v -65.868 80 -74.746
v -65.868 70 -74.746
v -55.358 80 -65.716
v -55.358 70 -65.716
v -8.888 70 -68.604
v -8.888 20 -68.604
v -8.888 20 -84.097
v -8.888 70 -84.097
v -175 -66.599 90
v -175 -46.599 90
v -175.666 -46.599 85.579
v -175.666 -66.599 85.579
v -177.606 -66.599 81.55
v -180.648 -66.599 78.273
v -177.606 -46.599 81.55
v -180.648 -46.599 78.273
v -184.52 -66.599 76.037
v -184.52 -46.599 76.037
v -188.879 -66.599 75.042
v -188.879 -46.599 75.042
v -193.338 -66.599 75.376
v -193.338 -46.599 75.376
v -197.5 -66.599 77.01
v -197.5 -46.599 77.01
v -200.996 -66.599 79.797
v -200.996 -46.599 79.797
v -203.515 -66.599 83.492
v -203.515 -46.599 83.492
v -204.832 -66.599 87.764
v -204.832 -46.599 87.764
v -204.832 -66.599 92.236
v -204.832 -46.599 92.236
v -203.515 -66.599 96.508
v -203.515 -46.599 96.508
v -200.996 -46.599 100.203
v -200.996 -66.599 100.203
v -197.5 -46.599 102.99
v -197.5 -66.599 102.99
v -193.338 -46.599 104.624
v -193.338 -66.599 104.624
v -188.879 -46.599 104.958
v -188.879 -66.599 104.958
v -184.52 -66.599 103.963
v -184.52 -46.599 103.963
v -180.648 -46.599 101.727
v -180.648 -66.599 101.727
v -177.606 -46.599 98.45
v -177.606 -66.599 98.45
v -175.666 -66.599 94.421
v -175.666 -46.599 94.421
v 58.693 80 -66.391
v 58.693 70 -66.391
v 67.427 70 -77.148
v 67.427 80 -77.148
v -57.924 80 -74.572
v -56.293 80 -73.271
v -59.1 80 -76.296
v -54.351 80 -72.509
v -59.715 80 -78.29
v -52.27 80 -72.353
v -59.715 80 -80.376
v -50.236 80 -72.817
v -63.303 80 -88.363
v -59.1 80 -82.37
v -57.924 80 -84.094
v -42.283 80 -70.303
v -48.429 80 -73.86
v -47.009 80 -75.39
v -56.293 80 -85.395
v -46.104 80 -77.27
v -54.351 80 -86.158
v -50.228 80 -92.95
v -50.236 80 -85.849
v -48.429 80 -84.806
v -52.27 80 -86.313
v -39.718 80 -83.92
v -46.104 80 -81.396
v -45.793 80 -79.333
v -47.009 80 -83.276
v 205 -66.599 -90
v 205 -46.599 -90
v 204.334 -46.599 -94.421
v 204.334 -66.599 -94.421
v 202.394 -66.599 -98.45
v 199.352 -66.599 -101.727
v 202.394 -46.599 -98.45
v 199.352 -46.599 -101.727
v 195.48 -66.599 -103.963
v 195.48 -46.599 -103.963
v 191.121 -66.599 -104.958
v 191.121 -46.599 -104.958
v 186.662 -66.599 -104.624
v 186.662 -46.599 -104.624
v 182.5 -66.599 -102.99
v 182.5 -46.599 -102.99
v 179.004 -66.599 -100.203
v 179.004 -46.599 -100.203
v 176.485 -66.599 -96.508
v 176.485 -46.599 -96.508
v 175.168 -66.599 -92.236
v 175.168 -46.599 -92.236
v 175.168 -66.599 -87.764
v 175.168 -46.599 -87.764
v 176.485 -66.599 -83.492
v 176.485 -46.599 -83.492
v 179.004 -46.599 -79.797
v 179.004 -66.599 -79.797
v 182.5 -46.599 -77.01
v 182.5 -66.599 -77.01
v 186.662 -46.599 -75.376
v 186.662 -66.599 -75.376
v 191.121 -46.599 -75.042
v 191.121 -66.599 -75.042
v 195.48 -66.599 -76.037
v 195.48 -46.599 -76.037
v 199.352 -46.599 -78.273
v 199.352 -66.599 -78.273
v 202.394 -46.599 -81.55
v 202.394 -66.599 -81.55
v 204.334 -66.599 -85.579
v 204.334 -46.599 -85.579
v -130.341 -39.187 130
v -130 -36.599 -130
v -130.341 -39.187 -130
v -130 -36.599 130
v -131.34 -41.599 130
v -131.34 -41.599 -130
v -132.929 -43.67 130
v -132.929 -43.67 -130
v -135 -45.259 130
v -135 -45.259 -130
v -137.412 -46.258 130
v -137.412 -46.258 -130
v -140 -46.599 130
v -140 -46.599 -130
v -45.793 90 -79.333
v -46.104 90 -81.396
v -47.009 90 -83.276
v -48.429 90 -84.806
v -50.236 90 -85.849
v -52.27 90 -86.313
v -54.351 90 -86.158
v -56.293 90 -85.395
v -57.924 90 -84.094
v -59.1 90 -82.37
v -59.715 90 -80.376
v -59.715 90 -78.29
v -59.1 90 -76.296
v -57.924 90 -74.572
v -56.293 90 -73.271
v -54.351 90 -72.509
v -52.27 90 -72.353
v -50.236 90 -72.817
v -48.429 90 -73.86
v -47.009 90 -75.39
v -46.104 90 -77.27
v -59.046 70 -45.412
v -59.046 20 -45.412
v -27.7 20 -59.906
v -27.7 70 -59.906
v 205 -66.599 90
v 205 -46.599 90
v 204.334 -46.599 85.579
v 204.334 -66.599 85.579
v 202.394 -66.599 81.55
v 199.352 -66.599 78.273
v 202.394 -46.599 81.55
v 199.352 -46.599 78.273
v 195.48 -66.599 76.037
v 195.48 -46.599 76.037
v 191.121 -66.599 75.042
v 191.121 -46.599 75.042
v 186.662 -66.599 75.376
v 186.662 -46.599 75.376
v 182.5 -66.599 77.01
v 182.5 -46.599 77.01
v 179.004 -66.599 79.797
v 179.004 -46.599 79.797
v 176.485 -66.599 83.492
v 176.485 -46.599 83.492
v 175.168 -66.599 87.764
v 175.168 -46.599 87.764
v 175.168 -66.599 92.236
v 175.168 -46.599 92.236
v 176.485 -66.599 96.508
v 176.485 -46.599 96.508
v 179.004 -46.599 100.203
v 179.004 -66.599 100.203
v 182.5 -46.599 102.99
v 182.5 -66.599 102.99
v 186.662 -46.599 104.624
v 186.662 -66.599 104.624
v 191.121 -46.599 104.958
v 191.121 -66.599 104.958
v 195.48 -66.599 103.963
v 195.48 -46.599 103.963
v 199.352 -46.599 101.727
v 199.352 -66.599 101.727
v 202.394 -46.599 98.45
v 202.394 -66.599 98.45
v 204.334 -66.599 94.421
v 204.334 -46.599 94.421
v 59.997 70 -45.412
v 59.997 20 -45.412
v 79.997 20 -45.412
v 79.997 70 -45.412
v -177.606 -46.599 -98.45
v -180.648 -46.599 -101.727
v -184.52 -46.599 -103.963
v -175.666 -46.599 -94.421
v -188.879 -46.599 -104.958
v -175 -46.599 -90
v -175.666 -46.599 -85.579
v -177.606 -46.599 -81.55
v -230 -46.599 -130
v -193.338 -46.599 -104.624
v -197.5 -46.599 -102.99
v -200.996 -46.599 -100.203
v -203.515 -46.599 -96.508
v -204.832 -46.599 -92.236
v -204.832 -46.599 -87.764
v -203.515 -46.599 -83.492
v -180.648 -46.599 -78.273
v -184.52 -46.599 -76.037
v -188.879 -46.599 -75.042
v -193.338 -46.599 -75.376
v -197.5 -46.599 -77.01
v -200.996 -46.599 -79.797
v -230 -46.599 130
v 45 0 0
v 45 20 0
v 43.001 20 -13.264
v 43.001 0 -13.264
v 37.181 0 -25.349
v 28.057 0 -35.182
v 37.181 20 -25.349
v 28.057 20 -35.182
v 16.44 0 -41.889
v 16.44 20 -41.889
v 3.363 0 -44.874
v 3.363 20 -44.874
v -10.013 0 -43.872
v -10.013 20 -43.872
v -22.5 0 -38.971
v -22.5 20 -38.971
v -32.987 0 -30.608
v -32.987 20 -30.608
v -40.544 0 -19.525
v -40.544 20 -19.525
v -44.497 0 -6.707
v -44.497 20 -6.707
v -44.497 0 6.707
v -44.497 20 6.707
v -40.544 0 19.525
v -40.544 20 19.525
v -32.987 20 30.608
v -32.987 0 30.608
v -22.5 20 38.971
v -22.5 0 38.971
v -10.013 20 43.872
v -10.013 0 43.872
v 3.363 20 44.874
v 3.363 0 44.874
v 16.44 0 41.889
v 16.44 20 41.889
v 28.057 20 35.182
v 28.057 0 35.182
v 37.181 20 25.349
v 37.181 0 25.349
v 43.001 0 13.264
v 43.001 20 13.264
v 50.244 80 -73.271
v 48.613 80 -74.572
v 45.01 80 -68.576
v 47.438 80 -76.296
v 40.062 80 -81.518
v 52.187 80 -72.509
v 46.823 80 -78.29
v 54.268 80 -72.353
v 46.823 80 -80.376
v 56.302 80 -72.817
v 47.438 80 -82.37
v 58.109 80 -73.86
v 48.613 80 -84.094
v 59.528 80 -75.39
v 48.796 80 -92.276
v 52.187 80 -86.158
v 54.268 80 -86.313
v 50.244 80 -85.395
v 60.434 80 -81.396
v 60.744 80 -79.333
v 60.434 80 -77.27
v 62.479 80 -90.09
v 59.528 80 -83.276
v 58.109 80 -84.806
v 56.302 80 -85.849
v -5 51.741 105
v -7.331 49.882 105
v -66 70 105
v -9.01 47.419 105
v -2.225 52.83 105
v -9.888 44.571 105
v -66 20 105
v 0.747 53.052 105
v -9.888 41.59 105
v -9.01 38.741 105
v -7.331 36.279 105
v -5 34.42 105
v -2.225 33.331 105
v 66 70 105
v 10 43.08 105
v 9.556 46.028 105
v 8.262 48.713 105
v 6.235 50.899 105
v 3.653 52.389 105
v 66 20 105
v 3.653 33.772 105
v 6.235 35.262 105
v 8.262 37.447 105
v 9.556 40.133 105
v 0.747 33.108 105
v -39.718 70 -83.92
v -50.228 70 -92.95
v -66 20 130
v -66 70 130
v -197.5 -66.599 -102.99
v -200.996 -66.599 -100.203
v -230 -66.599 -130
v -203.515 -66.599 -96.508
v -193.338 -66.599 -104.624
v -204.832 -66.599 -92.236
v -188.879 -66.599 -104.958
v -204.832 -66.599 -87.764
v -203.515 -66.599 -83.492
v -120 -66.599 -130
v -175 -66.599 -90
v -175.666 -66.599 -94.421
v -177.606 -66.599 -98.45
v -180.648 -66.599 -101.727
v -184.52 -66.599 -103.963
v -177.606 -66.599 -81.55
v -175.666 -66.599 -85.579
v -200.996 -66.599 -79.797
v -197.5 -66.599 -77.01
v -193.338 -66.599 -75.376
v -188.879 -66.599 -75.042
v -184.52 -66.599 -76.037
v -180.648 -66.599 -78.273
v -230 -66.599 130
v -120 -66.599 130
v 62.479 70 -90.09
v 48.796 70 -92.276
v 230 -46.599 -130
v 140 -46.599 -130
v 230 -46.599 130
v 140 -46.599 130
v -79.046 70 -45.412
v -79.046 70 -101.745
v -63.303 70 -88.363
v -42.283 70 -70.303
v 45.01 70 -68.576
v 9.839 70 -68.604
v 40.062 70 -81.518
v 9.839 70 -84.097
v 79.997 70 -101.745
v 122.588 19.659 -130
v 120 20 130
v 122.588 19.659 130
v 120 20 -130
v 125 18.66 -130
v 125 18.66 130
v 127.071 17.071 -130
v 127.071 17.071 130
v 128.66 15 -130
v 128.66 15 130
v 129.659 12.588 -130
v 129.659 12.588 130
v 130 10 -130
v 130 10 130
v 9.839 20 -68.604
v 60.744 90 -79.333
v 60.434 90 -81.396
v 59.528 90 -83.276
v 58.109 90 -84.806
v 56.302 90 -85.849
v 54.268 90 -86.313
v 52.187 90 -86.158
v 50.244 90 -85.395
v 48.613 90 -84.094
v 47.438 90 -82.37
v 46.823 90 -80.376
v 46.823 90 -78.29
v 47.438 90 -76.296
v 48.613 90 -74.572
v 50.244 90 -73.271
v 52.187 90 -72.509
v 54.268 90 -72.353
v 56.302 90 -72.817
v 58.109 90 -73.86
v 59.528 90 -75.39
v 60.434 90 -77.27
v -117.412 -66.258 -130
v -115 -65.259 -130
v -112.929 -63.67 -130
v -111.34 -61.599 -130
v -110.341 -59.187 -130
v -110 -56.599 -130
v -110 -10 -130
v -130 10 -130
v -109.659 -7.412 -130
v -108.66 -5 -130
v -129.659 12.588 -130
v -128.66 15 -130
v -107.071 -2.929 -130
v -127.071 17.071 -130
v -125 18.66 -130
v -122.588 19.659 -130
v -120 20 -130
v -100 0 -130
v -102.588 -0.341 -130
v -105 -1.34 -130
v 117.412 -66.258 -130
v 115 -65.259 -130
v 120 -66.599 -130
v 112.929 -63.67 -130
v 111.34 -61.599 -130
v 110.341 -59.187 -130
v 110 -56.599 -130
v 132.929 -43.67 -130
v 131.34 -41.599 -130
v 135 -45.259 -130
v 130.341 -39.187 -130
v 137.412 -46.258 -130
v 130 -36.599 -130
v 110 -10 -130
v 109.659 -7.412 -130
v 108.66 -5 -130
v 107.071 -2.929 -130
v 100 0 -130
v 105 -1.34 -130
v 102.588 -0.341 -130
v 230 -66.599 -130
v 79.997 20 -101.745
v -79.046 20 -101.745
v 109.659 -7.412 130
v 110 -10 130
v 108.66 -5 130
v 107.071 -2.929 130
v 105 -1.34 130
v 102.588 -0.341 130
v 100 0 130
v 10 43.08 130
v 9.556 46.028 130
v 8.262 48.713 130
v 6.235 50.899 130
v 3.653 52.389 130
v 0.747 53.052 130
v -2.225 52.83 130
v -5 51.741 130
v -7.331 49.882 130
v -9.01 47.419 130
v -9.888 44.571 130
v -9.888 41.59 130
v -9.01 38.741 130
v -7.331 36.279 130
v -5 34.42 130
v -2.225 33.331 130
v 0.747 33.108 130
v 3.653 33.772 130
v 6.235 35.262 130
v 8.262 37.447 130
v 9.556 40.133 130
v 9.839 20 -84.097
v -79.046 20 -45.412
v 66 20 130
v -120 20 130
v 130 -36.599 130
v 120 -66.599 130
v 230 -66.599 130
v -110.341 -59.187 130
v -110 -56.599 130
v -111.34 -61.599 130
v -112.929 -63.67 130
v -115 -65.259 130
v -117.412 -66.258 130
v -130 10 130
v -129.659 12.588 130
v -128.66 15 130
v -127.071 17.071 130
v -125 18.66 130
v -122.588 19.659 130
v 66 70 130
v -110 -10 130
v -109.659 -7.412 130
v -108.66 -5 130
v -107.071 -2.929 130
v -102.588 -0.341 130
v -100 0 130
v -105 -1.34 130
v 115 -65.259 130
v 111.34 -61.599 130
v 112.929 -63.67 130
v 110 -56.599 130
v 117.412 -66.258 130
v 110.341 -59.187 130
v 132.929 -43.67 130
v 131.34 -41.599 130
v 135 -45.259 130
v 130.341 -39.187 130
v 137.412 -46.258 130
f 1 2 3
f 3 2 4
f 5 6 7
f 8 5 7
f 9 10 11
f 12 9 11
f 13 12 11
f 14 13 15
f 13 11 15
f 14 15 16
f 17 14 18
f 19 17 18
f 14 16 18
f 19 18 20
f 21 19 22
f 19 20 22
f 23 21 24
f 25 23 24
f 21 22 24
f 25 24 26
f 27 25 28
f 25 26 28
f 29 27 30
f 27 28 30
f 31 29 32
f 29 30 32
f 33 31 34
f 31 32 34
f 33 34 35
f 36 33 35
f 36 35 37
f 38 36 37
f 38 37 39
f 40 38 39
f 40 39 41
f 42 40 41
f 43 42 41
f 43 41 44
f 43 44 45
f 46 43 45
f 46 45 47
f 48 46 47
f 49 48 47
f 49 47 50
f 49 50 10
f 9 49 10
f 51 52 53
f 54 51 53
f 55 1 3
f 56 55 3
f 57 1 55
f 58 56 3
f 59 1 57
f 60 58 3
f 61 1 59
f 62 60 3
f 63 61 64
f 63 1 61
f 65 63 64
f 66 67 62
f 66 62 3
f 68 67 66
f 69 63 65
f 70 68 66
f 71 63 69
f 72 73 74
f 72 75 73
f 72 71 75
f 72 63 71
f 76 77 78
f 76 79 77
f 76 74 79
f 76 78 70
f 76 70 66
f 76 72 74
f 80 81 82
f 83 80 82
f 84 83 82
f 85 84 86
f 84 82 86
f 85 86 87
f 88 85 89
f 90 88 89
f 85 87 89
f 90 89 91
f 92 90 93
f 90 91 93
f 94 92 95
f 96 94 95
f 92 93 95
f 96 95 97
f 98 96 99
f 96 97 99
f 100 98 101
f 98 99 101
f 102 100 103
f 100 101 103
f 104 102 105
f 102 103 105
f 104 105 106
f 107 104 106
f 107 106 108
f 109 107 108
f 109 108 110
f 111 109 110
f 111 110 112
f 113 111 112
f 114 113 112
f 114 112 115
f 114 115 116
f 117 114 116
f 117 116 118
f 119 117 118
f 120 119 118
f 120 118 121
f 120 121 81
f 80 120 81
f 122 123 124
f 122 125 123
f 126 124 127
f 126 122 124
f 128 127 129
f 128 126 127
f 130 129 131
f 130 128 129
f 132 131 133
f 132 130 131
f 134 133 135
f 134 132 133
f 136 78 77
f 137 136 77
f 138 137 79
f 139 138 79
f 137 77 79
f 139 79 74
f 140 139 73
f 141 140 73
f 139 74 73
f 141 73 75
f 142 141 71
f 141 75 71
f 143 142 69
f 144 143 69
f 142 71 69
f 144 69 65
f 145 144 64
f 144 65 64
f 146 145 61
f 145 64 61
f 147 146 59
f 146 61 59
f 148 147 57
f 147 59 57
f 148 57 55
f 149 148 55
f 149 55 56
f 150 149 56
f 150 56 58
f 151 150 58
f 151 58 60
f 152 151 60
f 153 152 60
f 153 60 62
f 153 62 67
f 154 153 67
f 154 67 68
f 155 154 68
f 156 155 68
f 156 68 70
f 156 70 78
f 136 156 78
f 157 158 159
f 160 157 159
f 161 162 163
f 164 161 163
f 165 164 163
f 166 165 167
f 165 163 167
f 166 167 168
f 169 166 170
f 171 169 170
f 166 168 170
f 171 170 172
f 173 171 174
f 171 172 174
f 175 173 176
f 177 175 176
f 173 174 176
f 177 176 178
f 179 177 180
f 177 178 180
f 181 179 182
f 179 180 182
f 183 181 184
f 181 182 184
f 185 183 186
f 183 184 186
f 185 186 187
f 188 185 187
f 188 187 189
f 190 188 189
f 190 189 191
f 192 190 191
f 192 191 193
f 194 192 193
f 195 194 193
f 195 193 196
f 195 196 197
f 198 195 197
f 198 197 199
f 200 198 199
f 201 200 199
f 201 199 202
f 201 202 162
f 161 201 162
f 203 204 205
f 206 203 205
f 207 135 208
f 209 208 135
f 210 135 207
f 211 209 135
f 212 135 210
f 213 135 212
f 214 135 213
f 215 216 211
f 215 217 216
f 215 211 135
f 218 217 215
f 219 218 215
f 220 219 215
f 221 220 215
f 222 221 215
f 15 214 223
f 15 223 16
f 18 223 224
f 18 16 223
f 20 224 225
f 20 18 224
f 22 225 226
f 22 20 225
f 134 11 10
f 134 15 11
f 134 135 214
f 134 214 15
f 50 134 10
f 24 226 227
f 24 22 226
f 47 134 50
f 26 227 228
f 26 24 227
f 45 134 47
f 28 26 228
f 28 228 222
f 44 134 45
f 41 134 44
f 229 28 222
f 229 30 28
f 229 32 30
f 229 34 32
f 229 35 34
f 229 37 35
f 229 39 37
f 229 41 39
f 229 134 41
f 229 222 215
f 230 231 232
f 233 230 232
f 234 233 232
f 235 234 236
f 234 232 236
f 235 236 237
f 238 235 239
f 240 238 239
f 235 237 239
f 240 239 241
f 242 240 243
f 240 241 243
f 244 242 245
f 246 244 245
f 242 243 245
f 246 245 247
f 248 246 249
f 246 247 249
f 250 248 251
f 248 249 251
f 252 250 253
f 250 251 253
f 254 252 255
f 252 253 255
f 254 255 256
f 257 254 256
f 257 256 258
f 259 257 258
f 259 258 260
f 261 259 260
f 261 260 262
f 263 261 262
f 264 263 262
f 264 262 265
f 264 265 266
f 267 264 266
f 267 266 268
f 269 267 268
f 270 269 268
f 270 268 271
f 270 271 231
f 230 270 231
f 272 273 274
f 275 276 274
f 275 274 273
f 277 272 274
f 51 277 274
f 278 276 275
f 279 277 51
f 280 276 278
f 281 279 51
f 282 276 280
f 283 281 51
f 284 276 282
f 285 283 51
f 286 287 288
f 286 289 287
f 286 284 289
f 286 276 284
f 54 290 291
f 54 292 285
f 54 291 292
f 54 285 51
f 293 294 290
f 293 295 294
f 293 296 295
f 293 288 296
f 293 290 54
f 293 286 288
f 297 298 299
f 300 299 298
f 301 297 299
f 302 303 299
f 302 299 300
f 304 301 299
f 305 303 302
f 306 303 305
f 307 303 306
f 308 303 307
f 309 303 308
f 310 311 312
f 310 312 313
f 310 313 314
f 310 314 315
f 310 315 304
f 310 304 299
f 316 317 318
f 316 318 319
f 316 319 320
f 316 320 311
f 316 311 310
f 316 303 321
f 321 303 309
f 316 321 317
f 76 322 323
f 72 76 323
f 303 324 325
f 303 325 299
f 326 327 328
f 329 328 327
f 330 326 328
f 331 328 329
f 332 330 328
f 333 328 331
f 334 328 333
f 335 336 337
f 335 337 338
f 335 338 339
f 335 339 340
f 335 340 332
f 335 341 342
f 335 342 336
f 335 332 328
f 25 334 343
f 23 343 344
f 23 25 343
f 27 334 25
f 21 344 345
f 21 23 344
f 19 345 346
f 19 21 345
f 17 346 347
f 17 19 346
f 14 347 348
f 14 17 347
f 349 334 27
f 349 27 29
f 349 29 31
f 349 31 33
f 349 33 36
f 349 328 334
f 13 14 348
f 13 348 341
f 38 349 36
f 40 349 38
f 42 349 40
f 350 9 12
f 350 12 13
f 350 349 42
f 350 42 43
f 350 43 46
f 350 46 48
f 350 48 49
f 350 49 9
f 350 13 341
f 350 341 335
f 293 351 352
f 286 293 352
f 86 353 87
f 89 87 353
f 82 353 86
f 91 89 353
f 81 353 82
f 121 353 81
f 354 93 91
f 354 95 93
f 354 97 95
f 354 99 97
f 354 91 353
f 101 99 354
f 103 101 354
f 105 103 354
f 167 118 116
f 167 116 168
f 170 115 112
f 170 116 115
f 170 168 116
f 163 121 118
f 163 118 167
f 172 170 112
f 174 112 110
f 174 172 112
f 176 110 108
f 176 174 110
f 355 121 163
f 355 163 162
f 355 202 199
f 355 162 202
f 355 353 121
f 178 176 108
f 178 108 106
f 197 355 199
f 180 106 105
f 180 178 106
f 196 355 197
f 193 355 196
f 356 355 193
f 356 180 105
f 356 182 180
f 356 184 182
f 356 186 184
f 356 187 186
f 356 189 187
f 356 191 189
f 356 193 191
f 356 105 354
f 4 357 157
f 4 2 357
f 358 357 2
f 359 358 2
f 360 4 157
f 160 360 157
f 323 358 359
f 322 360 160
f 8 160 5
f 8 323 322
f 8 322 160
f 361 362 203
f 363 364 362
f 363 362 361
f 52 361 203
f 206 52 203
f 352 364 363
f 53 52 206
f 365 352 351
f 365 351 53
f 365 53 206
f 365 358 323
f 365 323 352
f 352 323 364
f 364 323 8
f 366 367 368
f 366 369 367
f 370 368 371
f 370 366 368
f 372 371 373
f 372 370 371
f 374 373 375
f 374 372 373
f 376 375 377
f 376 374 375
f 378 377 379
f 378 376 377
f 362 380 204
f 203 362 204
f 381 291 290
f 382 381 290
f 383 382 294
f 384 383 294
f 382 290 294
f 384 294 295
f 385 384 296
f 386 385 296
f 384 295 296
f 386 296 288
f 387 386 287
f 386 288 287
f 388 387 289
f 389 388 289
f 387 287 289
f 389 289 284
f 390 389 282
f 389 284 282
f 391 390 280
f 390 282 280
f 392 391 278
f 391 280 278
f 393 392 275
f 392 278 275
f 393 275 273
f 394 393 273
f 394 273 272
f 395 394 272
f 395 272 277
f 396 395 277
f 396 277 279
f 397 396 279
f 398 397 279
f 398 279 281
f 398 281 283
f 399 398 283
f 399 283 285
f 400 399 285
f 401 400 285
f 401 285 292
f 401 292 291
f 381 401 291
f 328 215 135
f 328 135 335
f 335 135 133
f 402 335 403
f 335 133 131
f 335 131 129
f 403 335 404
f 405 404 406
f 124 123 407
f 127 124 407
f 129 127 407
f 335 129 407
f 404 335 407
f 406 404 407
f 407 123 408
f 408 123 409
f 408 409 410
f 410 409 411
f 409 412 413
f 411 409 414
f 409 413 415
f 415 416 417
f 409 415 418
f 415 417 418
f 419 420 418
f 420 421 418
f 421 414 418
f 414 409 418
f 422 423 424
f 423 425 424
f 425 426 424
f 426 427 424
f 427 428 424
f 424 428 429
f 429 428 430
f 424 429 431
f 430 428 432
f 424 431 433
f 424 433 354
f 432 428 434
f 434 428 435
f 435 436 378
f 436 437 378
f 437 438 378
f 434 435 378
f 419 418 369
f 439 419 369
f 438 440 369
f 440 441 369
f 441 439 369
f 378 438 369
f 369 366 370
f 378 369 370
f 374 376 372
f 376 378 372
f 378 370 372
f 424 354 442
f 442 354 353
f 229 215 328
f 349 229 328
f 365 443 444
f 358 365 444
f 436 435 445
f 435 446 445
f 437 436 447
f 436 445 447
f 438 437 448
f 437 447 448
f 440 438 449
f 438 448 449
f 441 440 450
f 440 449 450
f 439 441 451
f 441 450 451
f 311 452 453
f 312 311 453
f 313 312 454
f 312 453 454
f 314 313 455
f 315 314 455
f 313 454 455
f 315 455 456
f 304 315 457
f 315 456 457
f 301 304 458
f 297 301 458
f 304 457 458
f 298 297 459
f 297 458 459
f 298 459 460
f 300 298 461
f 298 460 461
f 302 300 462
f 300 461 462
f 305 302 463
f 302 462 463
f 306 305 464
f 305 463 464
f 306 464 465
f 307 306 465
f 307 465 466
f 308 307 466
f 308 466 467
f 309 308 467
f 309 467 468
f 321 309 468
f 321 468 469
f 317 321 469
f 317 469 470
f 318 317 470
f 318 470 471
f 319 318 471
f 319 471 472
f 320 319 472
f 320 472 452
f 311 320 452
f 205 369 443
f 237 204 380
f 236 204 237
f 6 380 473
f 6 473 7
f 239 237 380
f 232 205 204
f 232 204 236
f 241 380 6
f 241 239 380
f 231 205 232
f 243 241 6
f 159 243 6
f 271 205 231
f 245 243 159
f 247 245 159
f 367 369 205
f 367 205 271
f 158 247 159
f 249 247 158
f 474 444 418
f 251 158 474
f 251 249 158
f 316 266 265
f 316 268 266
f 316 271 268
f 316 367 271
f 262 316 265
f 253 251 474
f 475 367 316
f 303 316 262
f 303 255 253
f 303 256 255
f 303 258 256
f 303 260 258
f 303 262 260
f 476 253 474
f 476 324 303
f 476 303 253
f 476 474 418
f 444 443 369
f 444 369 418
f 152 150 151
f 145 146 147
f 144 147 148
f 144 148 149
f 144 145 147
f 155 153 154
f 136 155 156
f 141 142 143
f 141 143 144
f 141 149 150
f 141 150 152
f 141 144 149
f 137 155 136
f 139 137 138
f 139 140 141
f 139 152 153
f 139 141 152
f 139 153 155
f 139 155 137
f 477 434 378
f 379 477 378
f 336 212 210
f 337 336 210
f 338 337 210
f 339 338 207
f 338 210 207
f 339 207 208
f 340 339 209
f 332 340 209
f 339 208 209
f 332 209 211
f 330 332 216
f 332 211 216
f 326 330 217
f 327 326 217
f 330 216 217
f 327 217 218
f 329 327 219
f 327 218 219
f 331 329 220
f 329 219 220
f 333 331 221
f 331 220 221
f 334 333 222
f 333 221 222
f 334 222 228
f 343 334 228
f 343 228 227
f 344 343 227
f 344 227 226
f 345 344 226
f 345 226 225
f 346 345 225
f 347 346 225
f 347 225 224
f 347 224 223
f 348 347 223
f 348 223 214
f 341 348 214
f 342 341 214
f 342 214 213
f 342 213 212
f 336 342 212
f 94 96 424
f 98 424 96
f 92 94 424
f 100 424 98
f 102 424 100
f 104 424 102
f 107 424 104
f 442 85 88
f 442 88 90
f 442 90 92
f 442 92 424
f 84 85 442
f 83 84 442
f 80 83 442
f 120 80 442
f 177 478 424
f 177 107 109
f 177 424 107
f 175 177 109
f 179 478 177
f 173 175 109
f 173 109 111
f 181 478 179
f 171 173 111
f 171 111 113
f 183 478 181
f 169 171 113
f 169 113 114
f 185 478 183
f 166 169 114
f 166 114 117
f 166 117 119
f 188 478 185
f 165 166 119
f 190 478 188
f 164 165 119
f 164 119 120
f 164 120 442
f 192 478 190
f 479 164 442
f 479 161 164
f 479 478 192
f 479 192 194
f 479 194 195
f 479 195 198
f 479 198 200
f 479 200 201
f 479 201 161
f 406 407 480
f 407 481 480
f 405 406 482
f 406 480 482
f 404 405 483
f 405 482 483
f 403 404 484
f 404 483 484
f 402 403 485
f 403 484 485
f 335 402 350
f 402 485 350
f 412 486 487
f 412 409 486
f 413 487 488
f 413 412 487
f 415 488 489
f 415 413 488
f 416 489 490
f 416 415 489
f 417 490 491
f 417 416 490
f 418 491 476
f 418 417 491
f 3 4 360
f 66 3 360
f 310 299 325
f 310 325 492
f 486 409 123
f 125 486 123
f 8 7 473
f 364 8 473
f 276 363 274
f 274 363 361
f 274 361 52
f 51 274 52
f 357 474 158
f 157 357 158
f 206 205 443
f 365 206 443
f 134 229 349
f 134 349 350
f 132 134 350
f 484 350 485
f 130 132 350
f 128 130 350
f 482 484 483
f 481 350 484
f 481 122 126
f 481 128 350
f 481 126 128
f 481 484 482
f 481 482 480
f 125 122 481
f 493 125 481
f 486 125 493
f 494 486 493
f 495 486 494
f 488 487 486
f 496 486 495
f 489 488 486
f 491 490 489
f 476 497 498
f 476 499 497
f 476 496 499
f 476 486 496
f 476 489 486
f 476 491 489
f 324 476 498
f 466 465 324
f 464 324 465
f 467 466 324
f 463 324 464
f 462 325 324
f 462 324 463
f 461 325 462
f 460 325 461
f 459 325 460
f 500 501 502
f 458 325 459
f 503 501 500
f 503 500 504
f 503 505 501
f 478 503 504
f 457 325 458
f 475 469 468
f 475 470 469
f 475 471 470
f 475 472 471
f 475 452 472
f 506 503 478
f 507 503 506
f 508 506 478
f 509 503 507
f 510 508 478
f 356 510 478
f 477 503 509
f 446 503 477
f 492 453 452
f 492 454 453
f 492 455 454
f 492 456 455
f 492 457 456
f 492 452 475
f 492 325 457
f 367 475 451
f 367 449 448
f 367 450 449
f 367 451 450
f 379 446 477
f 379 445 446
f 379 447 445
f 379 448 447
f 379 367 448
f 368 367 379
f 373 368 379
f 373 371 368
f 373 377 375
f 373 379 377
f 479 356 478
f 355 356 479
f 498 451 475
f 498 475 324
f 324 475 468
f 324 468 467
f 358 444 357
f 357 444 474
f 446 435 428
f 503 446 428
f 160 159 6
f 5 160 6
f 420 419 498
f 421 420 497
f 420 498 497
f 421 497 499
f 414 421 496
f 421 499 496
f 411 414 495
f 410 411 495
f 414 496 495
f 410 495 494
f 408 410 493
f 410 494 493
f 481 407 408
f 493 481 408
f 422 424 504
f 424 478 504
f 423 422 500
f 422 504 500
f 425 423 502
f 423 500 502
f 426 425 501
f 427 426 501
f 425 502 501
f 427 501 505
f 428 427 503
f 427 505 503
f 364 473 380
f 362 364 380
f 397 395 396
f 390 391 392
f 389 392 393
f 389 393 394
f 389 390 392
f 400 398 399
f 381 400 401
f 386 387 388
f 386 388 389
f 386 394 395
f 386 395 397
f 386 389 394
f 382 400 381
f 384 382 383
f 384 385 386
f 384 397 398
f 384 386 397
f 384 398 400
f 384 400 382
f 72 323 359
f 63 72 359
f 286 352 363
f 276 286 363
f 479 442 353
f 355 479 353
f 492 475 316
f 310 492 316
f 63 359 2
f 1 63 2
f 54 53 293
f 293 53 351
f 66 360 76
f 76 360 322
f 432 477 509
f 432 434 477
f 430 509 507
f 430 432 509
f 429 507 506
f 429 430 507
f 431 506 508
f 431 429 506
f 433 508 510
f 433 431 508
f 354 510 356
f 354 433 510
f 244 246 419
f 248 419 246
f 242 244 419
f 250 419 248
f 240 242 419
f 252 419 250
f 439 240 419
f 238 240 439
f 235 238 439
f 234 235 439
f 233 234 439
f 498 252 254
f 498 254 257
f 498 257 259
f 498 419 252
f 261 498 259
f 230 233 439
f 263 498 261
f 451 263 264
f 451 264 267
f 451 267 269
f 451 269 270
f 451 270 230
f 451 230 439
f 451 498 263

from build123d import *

# Parameters (mm, degrees)
EXTRUDE_1_DEPTH     = 130
FILLET_1_R          = 10
SKETCH_2_R          = 45
CUT_EXTRUDE_1_DEPTH = 260
SKETCH_3_R          = 7
EXTRUDE_2_DEPTH     = 50
SKETCH_4_R          = 7
EXTRUDE_3_DEPTH     = 10
SKETCH_5_R          = 7
EXTRUDE_4_DEPTH     = 70
SKETCH_6_W          = 132
SKETCH_6_H          = 25
EXTRUDE_5_DEPTH     = 50
SKETCH_7_R          = 10
CUT_EXTRUDE_2_DEPTH = 50
SKETCH_8_R          = 15
CUT_EXTRUDE_3_DEPTH = 30


with BuildPart() as part:
    # 草图1 → 凸台-拉伸1 (new body, symmetric)
    with BuildSketch(Plane.XY):
        Polygon((0, 0), (0, 20), (-130, 20), (-130, 10.839517471), (-130, -46.598965425), (-230, -46.598965425), (-230, -66.598965425), (-110, -66.598965425), (-110, 0), align=None)
        Polygon((130, 20), (0, 20), (0, 0), (110, 0), (110, -66.598965425), (230, -66.598965425), (230, -46.598965425), (130, -46.598965425), (130, 10.839517471), align=None)
    extrude(amount=EXTRUDE_1_DEPTH, both=True)

    # 圆角1
    fillet_1_edges = [part.edges().sort_by_distance(p)[0] for p in [
        (-130, 20, 0),
        (130, 20, 0),
        (130, -46.598965425, 0),
        (110, -66.598965425, 0),
        (110, 0, 0),
        (-110, 0, 0),
        (-110, -66.598965425, 0),
        (-130, -46.598965425, 0),
    ]]
    fillet(fillet_1_edges, radius=FILLET_1_R)

    # 草图2 → 切除-拉伸1 (cut)
    with BuildSketch(Plane(origin=(0, 20, 0), x_dir=(1, 0, 0), z_dir=(0, 1, 0))):
        Circle(SKETCH_2_R)
    extrude(amount=-CUT_EXTRUDE_1_DEPTH, mode=Mode.SUBTRACT)

    # 草图3 → 凸台-拉伸2 (add)
    with BuildSketch(Plane(origin=(0, 20, 0), x_dir=(1, 0, 0), z_dir=(0, 1, 0))):
        Polygon((79.997030901, 101.745041166), (0.475713007, 101.745041166), (0.475713007, 84.097255875), (9.839462373, 84.097255875), (9.839462373, 68.604224939), (59.997030901, 45.412205859), (79.997030901, 45.412205859), align=None)
        with Locations((53.744497978, 79.333035198)):
            Circle(SKETCH_3_R, mode=Mode.SUBTRACT)
        Polygon((-79.045604886, 45.412205859), (-59.045604886, 45.412205859), (-27.699569626, 59.906087225), (-8.888036358, 68.604224939), (-8.888036358, 84.097255875), (0.475713007, 84.097255875), (0.475713007, 101.745041166), (-79.045604886, 101.745041166), align=None)
        with Locations((-52.793071964, 79.333035198)):
            Circle(SKETCH_3_R, mode=Mode.SUBTRACT)
    extrude(amount=EXTRUDE_2_DEPTH)

    # 草图4 → 凸台-拉伸3 (add)
    with BuildSketch(Plane(origin=(0, 70, 0), x_dir=(1, 0, 0), z_dir=(0, 1, 0))):
        Polygon((48.795631933, 92.27555137), (40.061517162, 81.518449569), (45.010383207, 68.575933397), (58.693364024, 66.390519026), (67.427478795, 77.147620827), (62.47861275, 90.090136999), align=None)
        with Locations((53.744497978, 79.333035198)):
            Circle(SKETCH_4_R, mode=Mode.SUBTRACT)
        Polygon((-50.227927921, 92.949937784), (-63.303083503, 88.362966397), (-65.868227546, 74.746063811), (-55.358216006, 65.716132612), (-42.283060425, 70.303104), (-39.717916382, 83.920006586), align=None)
        with Locations((-52.793071964, 79.333035198)):
            Circle(SKETCH_4_R, mode=Mode.SUBTRACT)
    extrude(amount=EXTRUDE_3_DEPTH)

    # 草图5 → 凸台-拉伸4 (add)
    with BuildSketch(Plane(origin=(0, 20, 0), x_dir=(1, 0, 0), z_dir=(0, 1, 0))):
        with Locations((53.744497978, 79.333035198)):
            Circle(SKETCH_5_R)
        with Locations((-52.793071964, 79.333035198)):
            Circle(SKETCH_5_R)
    extrude(amount=EXTRUDE_4_DEPTH)

    # 草图6 → 凸台-拉伸5 (add)
    with BuildSketch(Plane(origin=(0, 20, 0), x_dir=(1, 0, 0), z_dir=(0, 1, 0))):
        with Locations((0, -117.5)):
            Rectangle(SKETCH_6_W, SKETCH_6_H)
    extrude(amount=EXTRUDE_5_DEPTH)

    # 草图7 → 切除-拉伸2 (cut)
    with BuildSketch(Plane.XY.offset(130)):
        with Locations((0, 43.080261377)):
            Circle(SKETCH_7_R)
    extrude(amount=-CUT_EXTRUDE_2_DEPTH, mode=Mode.SUBTRACT)

    # 草图8 → 切除-拉伸3 (cut)
    with BuildSketch(Plane(origin=(0, -46.598965425, 0), x_dir=(1, 0, 0), z_dir=(0, 1, 0))):
        with Locations((190, 90)):
            Circle(SKETCH_8_R)
        with Locations((190, -90)):
            Circle(SKETCH_8_R)
        with Locations((-190, -90)):
            Circle(SKETCH_8_R)
        with Locations((-190, 90)):
            Circle(SKETCH_8_R)
    extrude(amount=-CUT_EXTRUDE_3_DEPTH, mode=Mode.SUBTRACT)


solid = part.part
